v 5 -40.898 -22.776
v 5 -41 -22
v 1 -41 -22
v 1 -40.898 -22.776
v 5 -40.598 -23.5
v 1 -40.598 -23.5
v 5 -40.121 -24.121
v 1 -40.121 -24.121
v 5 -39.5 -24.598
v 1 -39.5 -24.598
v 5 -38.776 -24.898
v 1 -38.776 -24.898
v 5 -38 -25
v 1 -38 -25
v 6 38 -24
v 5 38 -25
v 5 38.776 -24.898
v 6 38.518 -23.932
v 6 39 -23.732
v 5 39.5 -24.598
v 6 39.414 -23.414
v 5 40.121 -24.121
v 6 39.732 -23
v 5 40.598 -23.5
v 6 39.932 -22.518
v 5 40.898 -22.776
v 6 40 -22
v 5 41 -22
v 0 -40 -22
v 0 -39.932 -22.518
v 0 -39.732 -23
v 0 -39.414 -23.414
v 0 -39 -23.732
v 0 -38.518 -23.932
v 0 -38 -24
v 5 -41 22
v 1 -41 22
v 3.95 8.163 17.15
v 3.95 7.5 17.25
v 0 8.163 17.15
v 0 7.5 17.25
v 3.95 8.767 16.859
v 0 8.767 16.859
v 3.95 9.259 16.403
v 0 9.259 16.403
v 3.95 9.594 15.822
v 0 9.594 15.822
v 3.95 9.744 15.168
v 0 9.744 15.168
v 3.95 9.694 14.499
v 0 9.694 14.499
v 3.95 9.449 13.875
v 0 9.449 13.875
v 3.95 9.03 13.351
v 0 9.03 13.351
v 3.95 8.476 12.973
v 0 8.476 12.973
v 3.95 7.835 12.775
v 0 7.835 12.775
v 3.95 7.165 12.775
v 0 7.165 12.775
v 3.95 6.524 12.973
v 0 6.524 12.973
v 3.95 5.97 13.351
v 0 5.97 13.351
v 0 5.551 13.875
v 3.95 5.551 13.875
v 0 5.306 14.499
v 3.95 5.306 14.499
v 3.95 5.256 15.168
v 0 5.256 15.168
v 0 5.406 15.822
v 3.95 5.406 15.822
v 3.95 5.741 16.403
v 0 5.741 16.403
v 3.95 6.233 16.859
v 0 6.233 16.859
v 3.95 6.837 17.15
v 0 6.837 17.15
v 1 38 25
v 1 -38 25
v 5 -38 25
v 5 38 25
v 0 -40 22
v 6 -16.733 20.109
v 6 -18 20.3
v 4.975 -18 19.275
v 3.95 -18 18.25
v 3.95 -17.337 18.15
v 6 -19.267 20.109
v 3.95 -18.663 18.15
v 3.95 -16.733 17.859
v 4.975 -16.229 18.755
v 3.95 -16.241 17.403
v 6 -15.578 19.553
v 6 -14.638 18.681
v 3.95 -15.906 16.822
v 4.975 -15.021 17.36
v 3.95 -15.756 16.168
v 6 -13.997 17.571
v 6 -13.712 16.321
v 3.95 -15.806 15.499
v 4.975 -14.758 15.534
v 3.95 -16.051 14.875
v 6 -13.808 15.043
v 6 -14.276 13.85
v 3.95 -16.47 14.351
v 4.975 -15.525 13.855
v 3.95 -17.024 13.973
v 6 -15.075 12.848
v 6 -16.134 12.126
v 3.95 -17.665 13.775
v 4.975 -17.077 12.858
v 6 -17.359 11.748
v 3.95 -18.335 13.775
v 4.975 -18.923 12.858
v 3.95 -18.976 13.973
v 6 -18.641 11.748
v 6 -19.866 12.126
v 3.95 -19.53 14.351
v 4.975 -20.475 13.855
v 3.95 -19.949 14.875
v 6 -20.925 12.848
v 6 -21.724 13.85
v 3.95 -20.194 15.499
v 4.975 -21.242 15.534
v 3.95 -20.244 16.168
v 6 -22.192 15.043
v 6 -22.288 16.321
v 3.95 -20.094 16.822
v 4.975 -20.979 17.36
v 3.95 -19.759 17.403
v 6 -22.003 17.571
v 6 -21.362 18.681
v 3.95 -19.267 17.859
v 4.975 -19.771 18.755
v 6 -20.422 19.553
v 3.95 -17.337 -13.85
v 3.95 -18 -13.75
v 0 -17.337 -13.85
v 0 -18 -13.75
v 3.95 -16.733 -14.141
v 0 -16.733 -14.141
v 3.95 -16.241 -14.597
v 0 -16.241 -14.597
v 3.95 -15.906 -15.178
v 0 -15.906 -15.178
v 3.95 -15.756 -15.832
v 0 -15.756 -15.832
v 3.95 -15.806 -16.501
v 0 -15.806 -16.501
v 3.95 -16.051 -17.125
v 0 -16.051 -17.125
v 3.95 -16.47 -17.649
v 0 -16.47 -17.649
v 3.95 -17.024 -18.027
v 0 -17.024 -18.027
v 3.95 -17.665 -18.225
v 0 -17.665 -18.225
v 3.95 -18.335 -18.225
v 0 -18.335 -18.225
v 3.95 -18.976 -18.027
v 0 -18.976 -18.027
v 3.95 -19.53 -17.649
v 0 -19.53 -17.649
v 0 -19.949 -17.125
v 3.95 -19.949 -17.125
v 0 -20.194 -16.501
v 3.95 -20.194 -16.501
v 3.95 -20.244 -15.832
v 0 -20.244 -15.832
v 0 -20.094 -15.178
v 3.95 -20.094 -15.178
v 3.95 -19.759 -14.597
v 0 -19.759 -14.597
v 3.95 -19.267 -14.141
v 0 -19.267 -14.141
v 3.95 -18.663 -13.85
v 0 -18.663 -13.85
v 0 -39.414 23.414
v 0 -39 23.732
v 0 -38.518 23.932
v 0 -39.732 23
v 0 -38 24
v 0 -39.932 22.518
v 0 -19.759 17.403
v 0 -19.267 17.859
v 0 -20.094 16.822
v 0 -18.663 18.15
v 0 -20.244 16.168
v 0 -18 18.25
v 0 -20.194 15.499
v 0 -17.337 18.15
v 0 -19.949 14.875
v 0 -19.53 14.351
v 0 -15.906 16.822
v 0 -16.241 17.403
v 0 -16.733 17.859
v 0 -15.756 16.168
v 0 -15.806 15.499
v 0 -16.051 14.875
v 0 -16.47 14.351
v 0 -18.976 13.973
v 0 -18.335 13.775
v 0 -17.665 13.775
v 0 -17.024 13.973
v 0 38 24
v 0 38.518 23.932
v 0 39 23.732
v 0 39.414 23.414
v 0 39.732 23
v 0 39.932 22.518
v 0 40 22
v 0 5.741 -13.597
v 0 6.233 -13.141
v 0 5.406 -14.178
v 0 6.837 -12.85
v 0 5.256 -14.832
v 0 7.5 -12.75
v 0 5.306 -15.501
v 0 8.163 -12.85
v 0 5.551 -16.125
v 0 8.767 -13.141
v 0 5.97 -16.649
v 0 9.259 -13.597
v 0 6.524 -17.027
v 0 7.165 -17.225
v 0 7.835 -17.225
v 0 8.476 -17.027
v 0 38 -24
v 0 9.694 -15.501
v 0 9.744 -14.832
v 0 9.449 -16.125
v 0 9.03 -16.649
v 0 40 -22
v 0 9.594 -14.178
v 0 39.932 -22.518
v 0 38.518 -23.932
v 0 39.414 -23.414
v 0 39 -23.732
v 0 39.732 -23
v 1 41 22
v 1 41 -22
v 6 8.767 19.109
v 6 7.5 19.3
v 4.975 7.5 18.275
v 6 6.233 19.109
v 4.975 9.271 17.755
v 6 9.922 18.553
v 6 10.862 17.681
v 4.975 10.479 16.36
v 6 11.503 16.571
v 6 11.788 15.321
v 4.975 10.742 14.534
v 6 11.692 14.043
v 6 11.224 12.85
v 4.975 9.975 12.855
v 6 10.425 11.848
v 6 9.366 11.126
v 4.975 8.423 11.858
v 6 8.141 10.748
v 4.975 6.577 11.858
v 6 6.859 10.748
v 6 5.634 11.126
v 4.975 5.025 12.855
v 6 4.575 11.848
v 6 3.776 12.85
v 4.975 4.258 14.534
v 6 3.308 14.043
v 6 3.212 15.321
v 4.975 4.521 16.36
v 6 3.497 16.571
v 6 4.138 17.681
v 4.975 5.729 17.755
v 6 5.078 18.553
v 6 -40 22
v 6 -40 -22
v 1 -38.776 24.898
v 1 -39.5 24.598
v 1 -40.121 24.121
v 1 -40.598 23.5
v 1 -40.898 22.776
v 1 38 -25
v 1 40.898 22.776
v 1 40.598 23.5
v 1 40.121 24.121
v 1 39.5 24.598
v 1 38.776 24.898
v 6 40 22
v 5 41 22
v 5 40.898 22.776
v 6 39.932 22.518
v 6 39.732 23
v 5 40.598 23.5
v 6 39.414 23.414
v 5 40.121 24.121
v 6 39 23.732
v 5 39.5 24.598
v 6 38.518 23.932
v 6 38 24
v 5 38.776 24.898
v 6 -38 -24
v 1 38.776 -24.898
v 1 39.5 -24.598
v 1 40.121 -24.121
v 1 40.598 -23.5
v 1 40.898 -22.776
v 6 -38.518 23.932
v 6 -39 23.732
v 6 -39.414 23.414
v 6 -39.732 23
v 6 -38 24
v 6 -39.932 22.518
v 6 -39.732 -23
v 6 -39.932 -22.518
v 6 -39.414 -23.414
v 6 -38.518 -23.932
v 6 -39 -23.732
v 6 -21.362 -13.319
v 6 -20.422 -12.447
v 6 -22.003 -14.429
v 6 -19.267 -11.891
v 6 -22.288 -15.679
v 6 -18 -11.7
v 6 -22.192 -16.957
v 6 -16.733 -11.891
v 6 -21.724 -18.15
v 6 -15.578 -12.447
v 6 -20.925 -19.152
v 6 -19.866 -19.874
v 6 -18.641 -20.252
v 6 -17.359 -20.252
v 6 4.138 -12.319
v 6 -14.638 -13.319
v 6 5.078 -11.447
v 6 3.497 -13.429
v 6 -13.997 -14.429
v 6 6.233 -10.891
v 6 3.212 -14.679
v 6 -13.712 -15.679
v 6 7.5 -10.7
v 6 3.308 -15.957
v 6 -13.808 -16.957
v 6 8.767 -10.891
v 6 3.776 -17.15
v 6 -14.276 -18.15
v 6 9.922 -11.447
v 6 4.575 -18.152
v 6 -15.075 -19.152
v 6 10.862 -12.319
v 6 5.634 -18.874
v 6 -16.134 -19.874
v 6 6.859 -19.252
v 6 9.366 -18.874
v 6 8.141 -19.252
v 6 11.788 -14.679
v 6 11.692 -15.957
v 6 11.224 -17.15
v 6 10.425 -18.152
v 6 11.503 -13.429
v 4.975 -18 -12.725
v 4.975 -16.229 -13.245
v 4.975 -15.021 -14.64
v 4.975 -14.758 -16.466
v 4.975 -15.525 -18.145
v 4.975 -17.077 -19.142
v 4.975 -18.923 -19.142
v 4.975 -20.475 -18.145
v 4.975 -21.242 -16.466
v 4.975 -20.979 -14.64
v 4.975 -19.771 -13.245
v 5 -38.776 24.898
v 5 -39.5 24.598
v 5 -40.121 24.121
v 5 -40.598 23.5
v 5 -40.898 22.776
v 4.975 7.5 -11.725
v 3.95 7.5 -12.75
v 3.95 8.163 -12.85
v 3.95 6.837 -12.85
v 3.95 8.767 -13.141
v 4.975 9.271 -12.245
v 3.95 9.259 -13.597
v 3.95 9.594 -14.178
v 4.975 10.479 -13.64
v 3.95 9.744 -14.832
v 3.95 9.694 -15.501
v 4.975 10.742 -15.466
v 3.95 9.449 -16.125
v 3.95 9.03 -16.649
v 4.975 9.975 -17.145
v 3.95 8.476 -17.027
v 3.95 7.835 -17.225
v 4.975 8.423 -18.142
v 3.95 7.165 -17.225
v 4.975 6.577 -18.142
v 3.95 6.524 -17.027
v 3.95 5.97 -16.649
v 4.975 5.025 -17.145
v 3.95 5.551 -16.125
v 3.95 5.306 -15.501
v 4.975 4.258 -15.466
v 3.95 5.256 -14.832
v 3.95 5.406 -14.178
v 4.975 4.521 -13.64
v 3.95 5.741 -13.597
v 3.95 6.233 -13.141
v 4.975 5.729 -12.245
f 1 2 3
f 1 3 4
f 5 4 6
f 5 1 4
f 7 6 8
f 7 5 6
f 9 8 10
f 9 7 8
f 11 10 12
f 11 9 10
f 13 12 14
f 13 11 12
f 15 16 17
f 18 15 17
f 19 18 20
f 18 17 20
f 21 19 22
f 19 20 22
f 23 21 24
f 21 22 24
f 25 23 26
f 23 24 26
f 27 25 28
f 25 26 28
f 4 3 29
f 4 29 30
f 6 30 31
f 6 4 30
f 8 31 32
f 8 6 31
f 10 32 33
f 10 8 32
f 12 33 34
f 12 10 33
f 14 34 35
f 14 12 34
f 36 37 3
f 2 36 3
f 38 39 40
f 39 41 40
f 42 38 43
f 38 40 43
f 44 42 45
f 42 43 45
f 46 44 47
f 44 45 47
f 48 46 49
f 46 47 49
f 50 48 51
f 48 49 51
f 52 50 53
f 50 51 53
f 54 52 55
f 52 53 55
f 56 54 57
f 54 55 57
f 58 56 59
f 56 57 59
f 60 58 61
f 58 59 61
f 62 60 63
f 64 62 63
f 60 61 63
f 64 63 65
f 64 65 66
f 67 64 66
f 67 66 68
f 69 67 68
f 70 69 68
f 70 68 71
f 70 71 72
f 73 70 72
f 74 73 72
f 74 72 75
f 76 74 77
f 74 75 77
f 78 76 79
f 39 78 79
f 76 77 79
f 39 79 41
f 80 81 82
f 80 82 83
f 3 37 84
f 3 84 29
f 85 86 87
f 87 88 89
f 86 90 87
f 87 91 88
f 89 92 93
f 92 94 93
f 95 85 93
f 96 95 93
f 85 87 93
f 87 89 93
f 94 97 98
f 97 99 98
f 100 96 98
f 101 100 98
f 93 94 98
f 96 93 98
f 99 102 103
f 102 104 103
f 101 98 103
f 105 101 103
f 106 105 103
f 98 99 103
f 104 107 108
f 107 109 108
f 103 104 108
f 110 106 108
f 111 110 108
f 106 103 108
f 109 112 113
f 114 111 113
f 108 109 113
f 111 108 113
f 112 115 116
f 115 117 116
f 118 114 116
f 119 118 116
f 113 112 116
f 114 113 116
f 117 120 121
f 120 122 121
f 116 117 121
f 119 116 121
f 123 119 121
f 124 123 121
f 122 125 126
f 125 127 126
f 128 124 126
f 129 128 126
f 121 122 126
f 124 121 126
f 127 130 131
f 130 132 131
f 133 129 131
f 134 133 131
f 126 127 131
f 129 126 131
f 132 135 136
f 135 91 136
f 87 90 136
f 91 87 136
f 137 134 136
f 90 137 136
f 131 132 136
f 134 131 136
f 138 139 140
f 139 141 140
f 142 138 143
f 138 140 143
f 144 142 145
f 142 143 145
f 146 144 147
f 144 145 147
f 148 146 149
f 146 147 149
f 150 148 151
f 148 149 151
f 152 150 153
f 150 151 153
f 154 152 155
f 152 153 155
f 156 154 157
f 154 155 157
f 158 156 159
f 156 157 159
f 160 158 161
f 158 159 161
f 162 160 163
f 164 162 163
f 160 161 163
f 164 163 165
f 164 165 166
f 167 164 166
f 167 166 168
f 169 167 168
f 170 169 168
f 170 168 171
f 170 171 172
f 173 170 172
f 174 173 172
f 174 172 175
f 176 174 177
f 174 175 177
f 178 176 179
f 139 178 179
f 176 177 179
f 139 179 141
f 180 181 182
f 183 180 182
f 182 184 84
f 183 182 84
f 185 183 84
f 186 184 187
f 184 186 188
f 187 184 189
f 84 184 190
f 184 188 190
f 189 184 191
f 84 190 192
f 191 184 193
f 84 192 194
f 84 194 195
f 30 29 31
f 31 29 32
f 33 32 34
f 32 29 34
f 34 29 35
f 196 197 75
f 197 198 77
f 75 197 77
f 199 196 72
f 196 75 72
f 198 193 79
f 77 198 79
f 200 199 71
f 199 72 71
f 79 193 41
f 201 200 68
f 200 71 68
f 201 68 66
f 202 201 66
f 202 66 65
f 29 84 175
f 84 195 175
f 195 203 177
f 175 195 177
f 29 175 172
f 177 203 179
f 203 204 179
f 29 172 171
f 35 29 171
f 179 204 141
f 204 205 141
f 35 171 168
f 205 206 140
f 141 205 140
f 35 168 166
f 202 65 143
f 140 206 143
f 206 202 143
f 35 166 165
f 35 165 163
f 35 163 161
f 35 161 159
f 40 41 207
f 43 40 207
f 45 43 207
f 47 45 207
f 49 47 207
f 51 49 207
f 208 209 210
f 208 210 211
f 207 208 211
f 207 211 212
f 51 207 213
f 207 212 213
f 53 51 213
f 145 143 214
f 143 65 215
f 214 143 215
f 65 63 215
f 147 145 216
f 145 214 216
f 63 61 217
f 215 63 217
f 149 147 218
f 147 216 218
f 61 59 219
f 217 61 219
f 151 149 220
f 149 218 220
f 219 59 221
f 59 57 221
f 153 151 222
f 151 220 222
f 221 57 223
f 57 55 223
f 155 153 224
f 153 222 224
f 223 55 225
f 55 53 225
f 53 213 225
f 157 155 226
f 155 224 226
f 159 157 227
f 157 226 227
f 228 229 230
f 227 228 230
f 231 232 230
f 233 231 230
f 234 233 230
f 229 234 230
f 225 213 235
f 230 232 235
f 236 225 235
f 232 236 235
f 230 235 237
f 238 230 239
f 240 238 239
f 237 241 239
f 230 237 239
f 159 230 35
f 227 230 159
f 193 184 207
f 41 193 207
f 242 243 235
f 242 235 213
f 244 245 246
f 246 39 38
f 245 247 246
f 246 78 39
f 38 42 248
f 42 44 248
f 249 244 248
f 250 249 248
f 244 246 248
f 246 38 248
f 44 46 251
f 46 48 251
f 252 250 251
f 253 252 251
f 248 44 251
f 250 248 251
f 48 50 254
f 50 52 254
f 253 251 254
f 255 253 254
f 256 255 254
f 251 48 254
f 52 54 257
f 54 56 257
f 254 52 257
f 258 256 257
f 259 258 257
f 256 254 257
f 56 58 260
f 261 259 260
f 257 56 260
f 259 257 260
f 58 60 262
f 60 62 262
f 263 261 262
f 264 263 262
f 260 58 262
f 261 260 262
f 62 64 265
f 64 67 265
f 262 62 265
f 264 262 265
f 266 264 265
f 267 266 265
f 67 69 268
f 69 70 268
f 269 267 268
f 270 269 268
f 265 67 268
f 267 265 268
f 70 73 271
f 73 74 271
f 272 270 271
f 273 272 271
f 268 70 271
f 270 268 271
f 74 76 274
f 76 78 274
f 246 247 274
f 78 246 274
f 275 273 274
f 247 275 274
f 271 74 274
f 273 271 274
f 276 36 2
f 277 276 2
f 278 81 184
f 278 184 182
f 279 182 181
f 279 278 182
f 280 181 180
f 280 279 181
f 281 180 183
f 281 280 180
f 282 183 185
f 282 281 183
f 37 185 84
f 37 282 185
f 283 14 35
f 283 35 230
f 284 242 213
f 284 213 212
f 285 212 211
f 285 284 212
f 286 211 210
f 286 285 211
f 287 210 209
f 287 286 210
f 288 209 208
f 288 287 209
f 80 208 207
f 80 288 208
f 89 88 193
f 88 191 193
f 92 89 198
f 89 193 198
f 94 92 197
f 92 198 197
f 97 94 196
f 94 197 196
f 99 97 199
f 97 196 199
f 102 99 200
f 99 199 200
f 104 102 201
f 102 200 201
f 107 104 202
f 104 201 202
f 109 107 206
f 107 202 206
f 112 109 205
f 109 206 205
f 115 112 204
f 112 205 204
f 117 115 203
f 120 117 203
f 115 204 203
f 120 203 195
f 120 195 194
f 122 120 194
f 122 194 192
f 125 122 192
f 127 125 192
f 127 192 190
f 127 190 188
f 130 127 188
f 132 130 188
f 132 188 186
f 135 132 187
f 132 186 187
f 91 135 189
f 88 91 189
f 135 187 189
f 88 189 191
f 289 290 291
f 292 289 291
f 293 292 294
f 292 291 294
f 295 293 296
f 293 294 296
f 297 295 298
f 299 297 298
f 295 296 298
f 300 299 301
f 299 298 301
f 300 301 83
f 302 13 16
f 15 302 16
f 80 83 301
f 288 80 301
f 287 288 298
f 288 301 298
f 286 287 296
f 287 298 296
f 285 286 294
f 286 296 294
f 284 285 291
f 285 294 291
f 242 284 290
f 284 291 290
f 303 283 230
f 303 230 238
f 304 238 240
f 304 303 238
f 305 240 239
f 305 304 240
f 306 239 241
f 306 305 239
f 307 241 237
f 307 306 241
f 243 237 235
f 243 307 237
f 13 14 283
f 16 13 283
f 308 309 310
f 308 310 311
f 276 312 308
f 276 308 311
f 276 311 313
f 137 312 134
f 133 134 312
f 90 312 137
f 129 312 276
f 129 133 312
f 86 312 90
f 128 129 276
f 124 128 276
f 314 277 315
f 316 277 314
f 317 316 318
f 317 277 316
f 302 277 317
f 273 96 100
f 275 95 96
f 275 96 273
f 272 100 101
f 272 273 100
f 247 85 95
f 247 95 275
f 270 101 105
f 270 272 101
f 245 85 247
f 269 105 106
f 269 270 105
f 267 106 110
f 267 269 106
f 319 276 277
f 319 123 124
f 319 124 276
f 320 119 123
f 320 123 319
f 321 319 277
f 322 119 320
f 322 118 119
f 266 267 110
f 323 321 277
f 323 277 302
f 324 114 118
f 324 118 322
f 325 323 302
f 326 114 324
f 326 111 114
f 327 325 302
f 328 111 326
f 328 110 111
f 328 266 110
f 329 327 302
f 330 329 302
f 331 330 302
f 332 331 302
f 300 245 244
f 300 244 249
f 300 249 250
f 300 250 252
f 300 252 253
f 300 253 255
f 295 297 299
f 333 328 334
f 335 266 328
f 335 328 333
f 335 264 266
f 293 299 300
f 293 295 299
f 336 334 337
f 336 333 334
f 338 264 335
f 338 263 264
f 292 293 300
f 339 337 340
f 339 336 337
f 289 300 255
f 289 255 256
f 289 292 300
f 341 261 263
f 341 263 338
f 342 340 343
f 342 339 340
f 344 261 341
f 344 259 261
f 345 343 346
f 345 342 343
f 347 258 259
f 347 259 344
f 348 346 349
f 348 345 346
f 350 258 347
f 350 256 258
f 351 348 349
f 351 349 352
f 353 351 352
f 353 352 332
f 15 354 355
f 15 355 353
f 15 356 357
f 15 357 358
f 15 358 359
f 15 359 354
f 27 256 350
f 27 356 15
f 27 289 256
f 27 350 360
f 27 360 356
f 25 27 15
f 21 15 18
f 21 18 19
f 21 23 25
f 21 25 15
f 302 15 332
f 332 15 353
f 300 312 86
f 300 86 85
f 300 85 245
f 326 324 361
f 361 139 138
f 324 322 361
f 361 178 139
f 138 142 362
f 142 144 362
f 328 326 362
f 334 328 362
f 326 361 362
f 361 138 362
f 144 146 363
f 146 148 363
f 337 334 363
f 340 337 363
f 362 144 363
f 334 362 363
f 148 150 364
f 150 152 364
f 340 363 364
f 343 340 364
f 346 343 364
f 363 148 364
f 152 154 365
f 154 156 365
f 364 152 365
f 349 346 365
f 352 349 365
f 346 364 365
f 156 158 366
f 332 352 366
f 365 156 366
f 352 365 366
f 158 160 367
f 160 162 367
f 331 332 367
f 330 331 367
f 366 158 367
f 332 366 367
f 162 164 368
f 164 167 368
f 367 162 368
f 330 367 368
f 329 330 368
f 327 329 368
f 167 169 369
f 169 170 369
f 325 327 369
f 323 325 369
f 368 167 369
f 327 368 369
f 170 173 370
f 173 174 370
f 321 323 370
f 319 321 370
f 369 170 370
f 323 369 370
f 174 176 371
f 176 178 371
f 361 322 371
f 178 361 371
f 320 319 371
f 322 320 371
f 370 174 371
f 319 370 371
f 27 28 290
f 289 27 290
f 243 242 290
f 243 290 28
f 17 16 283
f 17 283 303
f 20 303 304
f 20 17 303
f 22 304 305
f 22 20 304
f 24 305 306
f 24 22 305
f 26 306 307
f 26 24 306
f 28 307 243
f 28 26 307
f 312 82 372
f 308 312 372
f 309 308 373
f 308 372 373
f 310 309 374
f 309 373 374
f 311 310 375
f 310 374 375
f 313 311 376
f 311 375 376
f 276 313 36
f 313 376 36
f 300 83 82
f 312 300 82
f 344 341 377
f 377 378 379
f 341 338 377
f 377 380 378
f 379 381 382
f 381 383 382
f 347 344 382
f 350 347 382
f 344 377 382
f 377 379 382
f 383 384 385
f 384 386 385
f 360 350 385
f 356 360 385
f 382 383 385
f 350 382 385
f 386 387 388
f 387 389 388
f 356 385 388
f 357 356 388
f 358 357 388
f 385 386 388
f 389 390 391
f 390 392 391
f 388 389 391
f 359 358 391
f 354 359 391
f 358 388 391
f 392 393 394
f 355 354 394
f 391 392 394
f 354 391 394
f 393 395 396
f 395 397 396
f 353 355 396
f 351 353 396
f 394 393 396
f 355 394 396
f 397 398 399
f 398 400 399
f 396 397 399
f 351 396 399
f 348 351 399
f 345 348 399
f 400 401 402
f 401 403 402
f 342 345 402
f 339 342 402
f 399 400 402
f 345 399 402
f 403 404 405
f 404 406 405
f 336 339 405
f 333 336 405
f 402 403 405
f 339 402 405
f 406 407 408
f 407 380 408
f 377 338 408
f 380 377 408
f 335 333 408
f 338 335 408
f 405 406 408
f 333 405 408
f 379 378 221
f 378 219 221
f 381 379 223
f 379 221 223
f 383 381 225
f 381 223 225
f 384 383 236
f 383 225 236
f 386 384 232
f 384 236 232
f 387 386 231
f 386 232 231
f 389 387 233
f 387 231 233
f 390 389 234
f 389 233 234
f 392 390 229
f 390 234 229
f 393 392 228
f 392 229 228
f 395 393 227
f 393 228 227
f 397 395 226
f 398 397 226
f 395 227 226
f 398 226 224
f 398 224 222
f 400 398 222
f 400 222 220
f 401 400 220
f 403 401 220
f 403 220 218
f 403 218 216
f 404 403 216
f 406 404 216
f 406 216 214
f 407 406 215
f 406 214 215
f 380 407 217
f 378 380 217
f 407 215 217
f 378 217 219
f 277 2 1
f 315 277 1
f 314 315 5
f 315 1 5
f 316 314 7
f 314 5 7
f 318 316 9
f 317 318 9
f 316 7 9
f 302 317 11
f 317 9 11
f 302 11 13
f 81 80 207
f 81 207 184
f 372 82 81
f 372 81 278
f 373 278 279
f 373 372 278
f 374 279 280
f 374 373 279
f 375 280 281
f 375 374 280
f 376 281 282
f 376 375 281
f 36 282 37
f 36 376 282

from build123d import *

# Parameters (mm, degrees)
SKETCH_1_W                   = 50
SKETCH_1_H                   = 82
EXTRUDE_1_DEPTH              = 6
FILLET_1_R                   = 3
CHAMFER_1_SIZE               = 1
HOLE_WIZARD_M4_1_D           = 4.5
HOLE_WIZARD_M4_1_CSINK_D     = 8.6
HOLE_WIZARD_M4_1_CSINK_ANGLE = 90


with BuildPart() as part:
    # 草图1 → 凸台-拉伸1 (new body)
    with BuildSketch(Plane(origin=(0, 0, 0), x_dir=(0, 0, -1), z_dir=(1, 0, 0))):
        Rectangle(SKETCH_1_W, SKETCH_1_H)
    extrude(amount=EXTRUDE_1_DEPTH)

    # 圆角1
    fillet_1_edges = [part.edges().sort_by_distance(p)[0] for p in [
        (3, -41, -25),
        (3, -41, 25),
        (3, 41, 25),
        (3, 41, -25),
    ]]
    fillet(fillet_1_edges, radius=FILLET_1_R)

    # 倒角1
    chamfer_1_edges = [part.edges().sort_by_distance(p)[0] for p in [
        (0, -41, 0),
        (6, -41, 0),
        (0, 0, -25),
        (0, 0, 25),
        (0, 41, 0),
        (0, 40.121320344, -24.121320344),
        (0, 40.121320344, 24.121320344),
        (0, -40.121320344, -24.121320344),
        (0, -40.121320344, 24.121320344),
        (6, 0, 25),
        (6, 0, -25),
        (6, 41, 0),
        (6, 40.121320344, -24.121320344),
        (6, 40.121320344, 24.121320344),
        (6, -40.121320344, -24.121320344),
        (6, -40.121320344, 24.121320344),
    ]]
    chamfer(chamfer_1_edges, length=CHAMFER_1_SIZE)

    # M4 十字槽沉头木螺钉的锥形沉头孔1 (through all)
    with Locations(Plane(origin=(6, 0, 0), x_dir=(0, 0, -1), z_dir=(1, 0, 0))):
        with Locations((15, 7.5), (-15, 7.5), (16, -18), (-16, -18)):
            CounterSinkHole(HOLE_WIZARD_M4_1_D / 2, HOLE_WIZARD_M4_1_CSINK_D / 2, counter_sink_angle=HOLE_WIZARD_M4_1_CSINK_ANGLE)


solid = part.part
